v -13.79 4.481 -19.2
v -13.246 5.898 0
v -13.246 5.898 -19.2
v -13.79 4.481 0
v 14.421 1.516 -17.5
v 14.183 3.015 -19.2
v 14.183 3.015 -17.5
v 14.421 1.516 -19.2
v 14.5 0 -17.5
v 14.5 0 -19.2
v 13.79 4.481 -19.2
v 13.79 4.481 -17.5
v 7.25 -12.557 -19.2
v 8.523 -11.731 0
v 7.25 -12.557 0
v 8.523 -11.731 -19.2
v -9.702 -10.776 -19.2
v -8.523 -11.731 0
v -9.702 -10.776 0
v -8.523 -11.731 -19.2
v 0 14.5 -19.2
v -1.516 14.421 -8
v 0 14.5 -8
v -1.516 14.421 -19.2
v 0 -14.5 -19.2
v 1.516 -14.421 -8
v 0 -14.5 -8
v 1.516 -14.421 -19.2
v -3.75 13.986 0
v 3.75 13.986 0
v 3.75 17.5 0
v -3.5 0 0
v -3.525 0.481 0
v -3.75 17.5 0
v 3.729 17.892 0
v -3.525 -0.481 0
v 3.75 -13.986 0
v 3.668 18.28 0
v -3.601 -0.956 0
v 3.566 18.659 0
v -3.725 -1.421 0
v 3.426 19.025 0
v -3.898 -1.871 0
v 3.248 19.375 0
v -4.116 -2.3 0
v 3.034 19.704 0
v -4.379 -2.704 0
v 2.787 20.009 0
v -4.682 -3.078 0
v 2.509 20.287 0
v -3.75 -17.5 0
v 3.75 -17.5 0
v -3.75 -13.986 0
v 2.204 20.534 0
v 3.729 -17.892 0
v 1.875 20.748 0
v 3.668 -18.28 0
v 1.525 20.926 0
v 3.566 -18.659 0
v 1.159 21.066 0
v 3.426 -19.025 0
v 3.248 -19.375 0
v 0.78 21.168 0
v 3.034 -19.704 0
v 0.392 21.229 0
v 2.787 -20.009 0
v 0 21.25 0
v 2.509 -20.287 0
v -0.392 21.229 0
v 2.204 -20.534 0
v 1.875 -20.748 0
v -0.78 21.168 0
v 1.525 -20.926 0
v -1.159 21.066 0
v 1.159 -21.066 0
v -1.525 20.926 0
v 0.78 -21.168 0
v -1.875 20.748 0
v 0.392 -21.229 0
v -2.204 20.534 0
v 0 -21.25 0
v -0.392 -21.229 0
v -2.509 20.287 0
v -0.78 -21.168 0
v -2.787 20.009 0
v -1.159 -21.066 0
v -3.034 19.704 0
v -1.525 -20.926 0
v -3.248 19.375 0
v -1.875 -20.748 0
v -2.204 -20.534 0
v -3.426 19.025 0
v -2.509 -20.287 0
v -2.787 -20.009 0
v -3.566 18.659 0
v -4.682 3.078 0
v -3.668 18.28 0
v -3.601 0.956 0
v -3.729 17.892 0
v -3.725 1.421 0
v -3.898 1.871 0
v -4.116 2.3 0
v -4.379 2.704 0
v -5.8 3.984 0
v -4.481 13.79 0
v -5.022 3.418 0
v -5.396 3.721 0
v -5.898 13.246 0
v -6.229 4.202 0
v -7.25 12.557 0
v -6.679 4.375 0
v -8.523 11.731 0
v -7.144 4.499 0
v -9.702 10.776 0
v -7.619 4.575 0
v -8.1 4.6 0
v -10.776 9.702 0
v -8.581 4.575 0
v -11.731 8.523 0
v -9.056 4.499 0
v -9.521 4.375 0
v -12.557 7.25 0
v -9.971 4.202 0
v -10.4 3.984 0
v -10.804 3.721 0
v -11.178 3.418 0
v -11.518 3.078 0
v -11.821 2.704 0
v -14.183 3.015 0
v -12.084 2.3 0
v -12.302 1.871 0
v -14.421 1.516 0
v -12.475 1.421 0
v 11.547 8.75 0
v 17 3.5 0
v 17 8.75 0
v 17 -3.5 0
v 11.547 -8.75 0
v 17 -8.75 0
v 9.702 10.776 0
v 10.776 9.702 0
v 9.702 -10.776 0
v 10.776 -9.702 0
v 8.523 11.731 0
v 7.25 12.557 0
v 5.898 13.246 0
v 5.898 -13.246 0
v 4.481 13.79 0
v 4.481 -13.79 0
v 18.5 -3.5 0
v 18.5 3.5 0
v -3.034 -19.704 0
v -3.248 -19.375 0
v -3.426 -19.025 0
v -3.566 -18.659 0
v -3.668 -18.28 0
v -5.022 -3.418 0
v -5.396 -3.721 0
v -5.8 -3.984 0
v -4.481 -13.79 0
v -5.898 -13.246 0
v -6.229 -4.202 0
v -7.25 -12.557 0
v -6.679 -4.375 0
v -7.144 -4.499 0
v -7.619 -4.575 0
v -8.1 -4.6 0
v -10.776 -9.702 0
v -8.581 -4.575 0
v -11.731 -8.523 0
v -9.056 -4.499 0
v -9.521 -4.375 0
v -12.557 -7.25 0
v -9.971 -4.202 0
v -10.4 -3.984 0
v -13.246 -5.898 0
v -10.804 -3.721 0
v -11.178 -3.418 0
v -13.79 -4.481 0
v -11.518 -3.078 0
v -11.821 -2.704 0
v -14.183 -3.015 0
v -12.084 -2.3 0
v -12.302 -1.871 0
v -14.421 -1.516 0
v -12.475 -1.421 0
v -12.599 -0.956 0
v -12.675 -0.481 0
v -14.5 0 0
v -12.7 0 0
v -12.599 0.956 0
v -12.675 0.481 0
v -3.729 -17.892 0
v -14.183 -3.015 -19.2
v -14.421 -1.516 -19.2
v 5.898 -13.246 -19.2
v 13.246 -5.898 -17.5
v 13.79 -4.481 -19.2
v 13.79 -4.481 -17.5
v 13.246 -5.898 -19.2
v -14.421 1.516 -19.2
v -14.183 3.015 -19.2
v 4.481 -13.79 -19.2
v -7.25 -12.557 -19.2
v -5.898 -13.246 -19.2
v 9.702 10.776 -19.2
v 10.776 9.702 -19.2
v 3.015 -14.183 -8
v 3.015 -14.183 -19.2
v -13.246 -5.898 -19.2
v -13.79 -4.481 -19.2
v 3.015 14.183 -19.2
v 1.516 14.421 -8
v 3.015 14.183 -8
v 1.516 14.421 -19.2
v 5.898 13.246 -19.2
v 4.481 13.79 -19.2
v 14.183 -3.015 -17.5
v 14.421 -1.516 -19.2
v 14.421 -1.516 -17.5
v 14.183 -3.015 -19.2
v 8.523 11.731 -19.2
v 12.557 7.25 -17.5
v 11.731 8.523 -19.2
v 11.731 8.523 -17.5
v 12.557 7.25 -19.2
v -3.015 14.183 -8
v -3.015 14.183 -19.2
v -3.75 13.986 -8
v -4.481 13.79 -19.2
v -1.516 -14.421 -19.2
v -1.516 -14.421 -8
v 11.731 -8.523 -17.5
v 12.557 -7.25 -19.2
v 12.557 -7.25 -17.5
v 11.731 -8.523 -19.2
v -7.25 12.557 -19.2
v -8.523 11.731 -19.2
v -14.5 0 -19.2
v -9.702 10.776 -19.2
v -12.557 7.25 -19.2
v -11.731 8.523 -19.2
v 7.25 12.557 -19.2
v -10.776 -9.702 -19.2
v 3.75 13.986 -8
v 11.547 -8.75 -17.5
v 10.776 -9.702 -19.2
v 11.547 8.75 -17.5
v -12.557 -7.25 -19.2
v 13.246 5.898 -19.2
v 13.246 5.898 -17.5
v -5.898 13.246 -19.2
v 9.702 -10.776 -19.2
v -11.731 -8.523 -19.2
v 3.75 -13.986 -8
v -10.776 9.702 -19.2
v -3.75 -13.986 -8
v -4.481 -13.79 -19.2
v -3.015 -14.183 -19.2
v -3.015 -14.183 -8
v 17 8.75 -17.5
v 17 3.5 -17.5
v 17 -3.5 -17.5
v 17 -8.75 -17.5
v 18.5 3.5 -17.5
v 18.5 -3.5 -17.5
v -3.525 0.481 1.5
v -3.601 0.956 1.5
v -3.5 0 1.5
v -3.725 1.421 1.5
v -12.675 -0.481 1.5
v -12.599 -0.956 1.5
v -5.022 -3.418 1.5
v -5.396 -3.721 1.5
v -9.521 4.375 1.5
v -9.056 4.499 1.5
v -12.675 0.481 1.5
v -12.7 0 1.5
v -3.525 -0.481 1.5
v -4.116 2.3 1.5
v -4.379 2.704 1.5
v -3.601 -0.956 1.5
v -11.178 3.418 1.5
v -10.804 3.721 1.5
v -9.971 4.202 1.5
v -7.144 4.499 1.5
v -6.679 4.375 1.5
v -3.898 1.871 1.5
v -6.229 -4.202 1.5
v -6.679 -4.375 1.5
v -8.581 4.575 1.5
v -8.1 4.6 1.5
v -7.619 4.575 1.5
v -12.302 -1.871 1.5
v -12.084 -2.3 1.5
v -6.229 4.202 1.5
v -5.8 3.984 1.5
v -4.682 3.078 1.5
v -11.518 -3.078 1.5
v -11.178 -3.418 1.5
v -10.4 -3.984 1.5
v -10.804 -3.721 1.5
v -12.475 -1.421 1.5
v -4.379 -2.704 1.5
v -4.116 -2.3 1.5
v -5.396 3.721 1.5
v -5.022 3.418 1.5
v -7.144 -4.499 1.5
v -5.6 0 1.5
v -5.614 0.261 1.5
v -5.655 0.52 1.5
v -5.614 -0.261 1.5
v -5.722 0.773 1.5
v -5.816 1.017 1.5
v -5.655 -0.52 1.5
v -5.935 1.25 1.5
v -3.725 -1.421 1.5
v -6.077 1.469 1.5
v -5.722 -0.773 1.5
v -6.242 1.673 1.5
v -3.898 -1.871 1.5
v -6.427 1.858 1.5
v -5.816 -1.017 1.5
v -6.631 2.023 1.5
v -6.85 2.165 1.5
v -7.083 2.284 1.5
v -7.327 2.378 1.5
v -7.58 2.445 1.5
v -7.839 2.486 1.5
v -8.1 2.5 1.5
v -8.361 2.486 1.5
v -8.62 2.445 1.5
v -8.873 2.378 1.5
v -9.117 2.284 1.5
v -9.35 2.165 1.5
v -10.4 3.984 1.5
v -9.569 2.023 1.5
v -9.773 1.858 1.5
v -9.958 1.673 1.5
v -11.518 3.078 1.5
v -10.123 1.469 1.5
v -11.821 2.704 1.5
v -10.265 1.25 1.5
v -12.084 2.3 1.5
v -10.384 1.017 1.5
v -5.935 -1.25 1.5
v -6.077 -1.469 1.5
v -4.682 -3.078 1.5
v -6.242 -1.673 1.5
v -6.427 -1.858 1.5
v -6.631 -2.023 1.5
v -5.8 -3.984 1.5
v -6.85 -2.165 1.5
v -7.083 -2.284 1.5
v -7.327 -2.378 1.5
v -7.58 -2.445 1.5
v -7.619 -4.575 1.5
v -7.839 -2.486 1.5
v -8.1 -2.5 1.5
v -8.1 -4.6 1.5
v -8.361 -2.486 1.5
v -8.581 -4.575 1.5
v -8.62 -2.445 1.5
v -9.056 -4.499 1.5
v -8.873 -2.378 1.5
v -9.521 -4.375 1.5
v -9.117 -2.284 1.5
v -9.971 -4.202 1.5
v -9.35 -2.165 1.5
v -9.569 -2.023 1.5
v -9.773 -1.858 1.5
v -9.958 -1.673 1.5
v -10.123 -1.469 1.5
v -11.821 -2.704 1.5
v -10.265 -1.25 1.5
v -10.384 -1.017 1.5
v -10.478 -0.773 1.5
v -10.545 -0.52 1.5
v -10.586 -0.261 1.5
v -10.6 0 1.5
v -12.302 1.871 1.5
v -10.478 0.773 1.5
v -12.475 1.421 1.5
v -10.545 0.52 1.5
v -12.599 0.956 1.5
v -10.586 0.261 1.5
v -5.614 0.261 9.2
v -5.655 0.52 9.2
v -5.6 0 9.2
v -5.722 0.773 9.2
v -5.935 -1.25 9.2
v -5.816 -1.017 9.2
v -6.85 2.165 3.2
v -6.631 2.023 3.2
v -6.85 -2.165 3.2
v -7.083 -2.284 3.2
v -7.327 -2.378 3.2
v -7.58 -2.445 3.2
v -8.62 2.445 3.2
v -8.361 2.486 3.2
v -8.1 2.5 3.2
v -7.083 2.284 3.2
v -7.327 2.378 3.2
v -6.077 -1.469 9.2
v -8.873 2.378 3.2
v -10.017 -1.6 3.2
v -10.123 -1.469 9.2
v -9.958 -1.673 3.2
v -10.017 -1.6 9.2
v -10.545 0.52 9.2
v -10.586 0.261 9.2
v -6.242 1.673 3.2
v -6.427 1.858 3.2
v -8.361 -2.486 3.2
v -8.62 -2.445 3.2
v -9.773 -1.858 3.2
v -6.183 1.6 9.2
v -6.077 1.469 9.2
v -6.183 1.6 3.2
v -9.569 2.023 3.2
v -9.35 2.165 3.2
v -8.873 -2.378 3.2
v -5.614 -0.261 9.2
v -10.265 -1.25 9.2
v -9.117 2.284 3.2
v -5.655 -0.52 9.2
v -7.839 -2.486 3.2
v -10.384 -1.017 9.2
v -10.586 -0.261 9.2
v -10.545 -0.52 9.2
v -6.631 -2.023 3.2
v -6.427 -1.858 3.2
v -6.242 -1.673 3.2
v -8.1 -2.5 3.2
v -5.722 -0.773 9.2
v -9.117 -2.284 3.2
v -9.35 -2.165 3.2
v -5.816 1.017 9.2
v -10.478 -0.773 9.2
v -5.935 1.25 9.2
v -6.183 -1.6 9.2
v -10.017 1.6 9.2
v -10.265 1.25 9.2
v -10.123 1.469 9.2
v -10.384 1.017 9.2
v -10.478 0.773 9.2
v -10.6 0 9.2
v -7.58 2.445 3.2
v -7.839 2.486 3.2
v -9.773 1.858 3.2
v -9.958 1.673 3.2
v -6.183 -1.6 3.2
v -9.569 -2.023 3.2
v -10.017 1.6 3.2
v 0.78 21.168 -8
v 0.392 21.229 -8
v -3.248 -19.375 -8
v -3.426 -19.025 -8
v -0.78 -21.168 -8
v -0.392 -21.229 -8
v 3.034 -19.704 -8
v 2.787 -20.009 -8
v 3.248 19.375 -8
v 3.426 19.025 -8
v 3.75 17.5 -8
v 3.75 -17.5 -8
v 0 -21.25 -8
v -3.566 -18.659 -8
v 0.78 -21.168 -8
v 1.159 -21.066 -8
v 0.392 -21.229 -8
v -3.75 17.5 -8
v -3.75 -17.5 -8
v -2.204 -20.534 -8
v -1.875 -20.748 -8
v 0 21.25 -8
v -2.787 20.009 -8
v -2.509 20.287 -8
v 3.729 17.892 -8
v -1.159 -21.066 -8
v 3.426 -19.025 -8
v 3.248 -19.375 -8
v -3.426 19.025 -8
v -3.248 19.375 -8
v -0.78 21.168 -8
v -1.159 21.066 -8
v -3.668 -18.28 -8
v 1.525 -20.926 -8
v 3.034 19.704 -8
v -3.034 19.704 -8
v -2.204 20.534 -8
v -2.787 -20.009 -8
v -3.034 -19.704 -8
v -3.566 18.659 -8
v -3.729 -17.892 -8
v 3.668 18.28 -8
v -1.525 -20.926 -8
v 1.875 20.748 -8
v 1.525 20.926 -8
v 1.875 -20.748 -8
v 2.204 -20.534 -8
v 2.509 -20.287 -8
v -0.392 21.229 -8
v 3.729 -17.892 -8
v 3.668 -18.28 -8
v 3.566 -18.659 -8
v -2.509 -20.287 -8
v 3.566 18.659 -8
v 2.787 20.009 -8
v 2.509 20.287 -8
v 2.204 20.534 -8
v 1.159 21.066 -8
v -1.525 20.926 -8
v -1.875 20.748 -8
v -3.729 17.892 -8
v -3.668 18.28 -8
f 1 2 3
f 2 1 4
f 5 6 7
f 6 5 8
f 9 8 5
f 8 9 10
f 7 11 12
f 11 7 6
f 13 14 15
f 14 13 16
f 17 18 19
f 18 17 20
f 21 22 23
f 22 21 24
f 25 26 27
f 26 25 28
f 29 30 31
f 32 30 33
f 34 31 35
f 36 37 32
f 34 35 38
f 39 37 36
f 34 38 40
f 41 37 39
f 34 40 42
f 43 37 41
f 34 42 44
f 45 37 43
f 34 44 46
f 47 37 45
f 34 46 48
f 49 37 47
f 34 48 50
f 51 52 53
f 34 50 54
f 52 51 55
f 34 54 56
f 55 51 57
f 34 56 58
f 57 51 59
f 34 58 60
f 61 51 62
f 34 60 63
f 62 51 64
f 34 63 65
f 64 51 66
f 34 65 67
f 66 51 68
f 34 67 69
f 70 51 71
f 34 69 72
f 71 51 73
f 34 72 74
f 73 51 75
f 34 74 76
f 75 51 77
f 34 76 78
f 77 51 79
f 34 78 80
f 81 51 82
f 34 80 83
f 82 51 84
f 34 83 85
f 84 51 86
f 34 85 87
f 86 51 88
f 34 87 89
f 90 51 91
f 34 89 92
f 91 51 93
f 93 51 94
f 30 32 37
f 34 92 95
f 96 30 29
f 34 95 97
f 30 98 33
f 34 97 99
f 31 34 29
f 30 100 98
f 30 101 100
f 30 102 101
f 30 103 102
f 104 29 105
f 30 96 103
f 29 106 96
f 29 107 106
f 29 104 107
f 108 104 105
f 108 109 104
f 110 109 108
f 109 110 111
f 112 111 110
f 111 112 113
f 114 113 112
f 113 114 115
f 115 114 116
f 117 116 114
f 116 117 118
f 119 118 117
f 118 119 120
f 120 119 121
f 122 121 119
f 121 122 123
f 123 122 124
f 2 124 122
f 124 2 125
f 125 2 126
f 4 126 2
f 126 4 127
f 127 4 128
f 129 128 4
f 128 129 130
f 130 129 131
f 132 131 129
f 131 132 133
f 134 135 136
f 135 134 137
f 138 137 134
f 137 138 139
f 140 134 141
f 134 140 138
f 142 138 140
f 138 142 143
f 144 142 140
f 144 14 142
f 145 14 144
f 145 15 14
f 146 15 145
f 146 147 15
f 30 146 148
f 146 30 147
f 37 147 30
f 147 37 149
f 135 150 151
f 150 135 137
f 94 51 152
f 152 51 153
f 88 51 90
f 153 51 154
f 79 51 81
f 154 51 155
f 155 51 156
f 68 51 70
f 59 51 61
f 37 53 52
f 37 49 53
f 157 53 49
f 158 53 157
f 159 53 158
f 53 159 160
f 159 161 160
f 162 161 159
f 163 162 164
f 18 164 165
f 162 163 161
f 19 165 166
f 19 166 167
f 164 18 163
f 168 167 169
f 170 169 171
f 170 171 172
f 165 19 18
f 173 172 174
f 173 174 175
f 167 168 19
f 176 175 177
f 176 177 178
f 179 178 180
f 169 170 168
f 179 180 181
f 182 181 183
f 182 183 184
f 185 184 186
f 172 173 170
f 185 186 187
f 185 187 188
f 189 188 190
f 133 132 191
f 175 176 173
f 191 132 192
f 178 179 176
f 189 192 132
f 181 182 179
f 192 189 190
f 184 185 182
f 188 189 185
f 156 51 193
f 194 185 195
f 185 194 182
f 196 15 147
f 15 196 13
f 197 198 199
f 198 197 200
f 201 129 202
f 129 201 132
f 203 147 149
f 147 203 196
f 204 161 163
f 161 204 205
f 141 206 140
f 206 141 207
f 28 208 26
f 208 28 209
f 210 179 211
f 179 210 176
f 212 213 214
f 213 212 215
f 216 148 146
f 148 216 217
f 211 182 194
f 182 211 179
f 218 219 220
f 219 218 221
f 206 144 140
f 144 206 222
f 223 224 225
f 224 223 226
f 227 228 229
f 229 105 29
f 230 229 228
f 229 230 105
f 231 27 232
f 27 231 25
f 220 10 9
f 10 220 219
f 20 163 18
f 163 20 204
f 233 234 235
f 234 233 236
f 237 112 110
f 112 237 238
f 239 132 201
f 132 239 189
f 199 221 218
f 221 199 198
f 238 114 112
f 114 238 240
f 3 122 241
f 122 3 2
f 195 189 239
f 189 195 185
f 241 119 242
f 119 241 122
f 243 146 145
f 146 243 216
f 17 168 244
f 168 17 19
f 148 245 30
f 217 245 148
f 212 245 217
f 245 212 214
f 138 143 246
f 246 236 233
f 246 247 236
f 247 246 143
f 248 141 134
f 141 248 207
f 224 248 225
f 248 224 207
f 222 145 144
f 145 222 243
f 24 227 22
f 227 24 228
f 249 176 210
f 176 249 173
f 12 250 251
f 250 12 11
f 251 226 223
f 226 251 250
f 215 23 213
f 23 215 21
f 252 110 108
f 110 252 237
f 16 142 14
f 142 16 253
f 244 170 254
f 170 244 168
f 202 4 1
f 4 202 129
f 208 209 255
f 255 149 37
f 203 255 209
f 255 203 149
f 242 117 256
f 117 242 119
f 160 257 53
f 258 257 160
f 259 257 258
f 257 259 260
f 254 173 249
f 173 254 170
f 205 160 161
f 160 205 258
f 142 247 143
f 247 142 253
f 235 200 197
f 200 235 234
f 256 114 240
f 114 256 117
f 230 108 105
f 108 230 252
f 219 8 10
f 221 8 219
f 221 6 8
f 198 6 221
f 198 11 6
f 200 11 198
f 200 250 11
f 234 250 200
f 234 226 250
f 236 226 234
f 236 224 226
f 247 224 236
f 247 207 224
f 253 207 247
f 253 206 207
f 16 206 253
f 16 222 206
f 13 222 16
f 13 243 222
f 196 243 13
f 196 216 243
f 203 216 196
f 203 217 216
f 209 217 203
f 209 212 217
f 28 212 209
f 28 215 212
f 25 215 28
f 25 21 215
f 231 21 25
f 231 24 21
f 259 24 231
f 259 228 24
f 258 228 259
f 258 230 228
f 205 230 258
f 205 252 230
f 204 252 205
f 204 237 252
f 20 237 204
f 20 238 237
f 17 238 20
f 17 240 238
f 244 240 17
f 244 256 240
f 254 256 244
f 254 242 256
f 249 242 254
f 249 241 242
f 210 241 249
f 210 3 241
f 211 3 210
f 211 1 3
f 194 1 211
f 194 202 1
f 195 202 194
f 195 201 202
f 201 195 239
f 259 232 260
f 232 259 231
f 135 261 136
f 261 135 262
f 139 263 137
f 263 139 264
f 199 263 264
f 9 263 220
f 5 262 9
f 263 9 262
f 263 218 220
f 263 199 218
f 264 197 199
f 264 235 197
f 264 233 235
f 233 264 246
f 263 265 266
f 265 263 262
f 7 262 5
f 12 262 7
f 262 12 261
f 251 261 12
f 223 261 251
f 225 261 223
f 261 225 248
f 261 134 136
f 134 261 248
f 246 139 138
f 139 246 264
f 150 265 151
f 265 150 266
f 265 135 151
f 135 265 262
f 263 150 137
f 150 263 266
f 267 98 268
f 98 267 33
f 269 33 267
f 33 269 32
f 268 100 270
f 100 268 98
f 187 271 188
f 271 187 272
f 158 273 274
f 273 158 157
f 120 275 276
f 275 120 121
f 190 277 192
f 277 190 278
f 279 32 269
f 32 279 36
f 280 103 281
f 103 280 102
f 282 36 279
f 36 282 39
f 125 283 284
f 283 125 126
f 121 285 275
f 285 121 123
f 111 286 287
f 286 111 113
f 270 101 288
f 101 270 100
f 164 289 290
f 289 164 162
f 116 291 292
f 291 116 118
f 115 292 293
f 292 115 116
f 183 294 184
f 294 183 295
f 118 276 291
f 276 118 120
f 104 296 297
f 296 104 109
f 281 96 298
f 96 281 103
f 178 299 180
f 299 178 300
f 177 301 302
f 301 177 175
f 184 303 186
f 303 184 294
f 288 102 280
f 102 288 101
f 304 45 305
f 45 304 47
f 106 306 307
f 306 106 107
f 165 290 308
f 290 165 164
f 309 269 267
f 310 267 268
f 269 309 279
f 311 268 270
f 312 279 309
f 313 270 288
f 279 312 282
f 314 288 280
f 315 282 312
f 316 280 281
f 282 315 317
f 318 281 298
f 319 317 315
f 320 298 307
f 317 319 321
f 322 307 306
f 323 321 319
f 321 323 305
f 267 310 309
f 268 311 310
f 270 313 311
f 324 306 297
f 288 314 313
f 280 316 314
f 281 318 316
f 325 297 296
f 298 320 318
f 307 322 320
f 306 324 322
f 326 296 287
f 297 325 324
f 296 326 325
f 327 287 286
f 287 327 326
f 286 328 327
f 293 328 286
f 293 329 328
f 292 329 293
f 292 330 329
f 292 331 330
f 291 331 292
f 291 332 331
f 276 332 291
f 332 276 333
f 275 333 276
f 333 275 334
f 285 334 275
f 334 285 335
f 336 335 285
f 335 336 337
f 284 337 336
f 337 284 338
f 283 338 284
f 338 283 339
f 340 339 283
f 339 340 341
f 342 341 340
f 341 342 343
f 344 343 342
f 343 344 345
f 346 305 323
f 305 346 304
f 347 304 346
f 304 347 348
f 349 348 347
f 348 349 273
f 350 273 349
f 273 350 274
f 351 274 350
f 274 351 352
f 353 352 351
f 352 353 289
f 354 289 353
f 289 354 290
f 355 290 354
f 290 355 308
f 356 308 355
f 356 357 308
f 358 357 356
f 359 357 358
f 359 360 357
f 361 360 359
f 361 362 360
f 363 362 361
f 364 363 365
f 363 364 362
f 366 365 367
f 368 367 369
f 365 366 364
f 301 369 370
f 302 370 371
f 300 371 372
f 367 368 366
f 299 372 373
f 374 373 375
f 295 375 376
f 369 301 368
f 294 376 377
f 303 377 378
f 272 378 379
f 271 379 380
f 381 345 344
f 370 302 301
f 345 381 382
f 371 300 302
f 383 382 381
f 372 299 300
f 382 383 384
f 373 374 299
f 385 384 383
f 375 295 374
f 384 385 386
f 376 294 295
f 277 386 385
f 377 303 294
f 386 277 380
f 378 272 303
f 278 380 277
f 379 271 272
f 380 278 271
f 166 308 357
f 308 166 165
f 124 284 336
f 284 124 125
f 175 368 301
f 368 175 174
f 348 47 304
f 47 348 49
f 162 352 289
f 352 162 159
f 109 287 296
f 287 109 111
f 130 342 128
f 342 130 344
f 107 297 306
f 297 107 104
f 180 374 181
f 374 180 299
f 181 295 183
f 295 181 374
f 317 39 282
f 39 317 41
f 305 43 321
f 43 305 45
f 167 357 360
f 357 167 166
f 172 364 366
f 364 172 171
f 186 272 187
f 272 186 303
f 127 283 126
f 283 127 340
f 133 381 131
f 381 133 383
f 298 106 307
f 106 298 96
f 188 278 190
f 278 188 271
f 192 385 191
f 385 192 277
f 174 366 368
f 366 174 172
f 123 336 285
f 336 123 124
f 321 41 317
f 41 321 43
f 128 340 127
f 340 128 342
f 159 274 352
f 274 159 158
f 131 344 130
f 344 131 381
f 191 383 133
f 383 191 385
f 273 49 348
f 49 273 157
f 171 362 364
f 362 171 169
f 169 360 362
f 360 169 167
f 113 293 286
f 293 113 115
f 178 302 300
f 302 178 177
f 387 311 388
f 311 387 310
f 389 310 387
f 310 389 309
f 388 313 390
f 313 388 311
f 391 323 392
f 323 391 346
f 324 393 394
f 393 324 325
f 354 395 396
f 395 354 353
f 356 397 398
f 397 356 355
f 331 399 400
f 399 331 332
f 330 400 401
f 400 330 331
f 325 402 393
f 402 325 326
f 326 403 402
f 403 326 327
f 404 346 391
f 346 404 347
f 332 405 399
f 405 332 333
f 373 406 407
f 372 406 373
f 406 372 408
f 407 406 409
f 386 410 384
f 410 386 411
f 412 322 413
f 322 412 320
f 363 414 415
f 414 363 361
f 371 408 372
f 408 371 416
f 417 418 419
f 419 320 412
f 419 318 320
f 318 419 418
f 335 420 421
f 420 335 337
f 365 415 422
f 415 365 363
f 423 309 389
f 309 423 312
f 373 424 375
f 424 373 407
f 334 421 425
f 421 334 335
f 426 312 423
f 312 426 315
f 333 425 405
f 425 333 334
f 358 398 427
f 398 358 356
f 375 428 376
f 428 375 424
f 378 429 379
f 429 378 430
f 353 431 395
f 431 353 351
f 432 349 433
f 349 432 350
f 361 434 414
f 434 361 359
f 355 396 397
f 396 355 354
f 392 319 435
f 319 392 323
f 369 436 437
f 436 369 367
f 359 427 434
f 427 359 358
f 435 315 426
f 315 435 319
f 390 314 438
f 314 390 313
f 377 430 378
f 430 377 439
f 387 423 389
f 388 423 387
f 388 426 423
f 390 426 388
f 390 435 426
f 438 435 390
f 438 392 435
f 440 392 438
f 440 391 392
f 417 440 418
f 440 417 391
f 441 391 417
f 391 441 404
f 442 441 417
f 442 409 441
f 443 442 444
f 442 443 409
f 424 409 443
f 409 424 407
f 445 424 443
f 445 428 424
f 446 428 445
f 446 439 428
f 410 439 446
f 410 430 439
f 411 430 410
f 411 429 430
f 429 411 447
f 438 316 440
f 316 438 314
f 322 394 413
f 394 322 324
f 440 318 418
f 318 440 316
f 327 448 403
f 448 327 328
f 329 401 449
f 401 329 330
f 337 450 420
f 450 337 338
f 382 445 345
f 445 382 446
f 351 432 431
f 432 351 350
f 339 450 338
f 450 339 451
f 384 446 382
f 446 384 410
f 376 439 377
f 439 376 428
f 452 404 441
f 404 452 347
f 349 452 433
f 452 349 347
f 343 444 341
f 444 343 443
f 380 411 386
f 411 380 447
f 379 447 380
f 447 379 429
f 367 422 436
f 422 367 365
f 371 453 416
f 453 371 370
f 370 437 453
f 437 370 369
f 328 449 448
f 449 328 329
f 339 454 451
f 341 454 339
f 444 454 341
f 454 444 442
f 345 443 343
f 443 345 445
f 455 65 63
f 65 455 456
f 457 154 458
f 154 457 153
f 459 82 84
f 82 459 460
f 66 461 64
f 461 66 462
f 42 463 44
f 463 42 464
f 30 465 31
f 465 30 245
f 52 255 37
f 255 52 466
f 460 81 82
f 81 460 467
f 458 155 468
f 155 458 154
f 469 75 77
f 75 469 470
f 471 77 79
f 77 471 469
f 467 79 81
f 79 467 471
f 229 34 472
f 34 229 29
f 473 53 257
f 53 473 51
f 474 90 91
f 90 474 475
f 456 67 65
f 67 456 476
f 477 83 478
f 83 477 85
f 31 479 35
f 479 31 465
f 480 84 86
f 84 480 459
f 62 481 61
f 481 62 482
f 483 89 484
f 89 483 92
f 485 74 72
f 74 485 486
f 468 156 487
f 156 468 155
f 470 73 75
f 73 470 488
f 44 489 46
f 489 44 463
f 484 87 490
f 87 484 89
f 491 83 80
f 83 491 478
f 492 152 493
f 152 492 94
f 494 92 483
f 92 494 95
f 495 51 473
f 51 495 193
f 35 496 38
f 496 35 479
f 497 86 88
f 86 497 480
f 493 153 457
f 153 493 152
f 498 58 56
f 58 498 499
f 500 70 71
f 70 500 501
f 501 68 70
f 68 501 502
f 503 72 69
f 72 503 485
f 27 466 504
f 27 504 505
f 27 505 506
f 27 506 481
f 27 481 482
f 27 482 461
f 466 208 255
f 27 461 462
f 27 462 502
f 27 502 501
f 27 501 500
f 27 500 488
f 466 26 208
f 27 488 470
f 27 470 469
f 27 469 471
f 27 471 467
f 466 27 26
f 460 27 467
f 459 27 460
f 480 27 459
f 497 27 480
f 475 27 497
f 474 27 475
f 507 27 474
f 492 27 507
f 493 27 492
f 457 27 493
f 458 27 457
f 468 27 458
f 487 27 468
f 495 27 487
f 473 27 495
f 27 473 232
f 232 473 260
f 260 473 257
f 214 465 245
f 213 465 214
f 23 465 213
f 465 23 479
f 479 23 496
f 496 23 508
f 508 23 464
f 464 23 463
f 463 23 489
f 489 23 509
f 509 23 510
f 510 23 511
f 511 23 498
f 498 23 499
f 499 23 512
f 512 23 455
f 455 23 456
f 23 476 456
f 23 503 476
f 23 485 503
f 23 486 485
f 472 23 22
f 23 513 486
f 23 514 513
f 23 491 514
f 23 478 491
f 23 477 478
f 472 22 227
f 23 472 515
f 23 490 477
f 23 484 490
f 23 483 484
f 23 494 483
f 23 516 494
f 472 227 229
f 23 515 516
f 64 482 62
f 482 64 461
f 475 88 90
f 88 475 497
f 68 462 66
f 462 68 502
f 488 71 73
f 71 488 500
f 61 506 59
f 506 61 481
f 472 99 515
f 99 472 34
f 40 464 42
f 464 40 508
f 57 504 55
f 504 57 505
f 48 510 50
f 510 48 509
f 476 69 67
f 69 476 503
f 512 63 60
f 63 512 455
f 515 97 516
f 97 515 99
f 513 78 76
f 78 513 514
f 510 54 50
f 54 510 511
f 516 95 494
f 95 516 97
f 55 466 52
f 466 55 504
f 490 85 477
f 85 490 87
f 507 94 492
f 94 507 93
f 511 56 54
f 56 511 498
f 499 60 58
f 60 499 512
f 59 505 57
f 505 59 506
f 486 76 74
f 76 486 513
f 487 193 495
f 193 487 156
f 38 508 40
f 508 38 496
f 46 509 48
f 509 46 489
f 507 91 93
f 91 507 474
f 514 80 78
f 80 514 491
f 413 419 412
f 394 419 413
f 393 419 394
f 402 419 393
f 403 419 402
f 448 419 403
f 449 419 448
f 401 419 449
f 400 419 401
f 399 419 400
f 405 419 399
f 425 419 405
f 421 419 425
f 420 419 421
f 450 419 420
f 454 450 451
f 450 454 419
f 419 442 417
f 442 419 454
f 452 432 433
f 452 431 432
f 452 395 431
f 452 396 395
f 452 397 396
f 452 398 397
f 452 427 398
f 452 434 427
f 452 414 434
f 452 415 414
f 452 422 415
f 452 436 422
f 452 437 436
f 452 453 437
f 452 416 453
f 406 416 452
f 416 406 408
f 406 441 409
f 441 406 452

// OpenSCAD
// Model of cheap stepper motor 28BYJ 
// Include with use function to avoid calling top geometry

$fn=60;

module 28BYJ() {
    difference() {
        union() {
            translate([0,0,-19.2])cylinder(d=29,h=19.2);  //main cylinder
            translate([9,-8.75,-17.5])cube([8,17.5,17.5]);
            translate([10,-3.5,-17.5])cube([8.5,7,17.5]);
            translate([-8.1,0,-1])cylinder(d=9.2,h=2.5);//plate below shaft
            translate([-8.1,0,0])cylinder(d=5,h=9.2); //shaft
            hull() {
                translate([0,17.5,-8])cylinder(d=7.5,h=8);//left and right screw holder
                translate([0,-17.5,-8])cylinder(d=7.5,h=8);
            }
        }
        translate([-13,1.6,3.2])cube([10,4,10]);  //flat parts of shaft
        translate([-13,-5.6,3.2])cube([10,4,10]);
        //translate([0,17.5,-1])cylinder(d=4.2,h=2);
        //translate([0,-17.5,-1])cylinder(d=4.2,h=2);
    }
}

28BYJ();
